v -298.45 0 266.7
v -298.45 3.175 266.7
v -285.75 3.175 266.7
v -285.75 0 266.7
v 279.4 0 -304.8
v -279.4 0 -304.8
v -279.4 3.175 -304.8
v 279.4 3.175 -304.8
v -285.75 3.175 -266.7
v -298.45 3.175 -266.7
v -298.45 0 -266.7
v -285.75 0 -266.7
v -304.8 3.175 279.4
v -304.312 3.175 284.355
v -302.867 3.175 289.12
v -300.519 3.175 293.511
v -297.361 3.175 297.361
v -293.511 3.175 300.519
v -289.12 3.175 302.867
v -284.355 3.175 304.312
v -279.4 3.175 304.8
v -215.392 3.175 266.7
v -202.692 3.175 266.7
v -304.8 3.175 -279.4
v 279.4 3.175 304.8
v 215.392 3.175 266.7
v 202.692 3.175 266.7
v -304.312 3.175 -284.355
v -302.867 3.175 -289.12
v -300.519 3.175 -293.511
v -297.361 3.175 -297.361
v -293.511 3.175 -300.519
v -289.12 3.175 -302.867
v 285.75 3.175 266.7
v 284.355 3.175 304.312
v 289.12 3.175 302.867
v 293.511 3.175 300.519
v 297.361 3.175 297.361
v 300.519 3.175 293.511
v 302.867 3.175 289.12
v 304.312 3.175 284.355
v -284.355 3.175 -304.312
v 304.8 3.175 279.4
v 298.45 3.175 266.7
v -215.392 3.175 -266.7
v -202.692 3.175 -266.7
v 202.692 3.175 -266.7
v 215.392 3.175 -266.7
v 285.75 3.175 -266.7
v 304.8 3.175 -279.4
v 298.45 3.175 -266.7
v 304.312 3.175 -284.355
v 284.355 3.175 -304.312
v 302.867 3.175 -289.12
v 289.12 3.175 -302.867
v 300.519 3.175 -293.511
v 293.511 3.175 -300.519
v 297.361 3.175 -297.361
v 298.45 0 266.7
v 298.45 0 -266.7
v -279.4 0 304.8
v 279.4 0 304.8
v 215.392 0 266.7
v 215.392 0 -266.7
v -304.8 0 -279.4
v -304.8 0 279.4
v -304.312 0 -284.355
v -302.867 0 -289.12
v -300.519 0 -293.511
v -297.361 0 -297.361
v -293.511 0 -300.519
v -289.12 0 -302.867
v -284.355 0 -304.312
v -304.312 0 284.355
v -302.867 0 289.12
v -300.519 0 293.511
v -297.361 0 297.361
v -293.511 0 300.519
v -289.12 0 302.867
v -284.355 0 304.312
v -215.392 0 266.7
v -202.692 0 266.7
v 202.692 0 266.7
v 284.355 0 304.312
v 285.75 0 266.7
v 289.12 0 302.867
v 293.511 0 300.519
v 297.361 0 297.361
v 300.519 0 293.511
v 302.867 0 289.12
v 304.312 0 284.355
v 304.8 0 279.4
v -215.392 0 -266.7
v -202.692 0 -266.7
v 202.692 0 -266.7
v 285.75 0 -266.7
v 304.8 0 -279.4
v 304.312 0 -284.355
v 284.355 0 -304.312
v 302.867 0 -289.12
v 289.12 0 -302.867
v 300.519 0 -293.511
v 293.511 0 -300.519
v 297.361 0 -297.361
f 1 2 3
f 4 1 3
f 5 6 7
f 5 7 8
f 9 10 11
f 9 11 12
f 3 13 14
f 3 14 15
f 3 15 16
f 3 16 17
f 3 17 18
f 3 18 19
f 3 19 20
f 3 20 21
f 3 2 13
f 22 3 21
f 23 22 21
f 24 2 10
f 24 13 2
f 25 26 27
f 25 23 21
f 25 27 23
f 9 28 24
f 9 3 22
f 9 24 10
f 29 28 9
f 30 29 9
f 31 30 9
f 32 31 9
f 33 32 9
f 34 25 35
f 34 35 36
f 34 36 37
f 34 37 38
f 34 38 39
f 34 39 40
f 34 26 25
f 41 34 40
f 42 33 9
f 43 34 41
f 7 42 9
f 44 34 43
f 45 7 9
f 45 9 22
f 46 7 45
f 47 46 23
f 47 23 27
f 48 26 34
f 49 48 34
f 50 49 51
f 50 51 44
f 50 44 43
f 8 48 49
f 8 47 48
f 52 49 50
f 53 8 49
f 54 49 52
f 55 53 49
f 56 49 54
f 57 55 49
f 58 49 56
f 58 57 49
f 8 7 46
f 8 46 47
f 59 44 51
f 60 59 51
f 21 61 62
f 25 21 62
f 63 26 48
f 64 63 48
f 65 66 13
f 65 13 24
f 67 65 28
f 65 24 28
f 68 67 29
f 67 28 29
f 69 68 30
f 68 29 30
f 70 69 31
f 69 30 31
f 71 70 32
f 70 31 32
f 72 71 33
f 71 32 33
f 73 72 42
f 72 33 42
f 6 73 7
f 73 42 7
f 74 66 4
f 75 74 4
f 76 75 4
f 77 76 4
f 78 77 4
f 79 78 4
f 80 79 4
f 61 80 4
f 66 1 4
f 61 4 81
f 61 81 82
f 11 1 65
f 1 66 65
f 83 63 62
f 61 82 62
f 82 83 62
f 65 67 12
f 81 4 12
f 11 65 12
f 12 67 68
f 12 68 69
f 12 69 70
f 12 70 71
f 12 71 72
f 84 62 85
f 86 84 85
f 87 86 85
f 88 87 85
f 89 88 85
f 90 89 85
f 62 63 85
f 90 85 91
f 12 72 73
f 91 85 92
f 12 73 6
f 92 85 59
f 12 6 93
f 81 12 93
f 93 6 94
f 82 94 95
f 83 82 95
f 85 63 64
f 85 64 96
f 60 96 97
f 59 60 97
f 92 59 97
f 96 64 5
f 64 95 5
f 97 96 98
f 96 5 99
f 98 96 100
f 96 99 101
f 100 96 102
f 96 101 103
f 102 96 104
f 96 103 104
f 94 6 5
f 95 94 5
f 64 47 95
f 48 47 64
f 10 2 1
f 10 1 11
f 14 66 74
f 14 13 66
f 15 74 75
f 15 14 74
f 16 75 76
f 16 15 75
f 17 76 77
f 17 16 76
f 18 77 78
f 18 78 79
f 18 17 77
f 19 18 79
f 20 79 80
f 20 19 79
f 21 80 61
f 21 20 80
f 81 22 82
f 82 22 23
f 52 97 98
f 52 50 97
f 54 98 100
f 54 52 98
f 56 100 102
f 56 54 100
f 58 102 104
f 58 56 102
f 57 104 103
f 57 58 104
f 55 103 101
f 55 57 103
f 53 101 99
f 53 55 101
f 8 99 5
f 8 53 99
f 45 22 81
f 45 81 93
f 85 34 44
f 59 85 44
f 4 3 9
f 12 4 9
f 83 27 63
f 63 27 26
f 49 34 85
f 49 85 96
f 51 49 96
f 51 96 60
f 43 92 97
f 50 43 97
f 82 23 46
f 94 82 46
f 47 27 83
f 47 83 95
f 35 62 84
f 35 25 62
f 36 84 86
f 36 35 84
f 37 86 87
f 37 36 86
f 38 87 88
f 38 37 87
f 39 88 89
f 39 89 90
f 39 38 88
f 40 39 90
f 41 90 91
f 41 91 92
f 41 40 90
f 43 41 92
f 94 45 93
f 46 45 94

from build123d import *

# Parameters (mm, degrees)
SKETCH1_W           = 609.6
SKETCH1_H           = 609.6
BOSS_EXTRUDE1_DEPTH = 3.175
FILLET1_R           = 25.4
SKETCH2_W           = 12.7
SKETCH2_H           = 533.4
CUT_EXTRUDE1_DEPTH  = 3.175


with BuildPart() as part:
    # Sketch1 → Boss-Extrude1 (new body)
    with BuildSketch(Plane(origin=(0, 0, 0), x_dir=(1, 0, 0), z_dir=(0, 1, 0))):
        Rectangle(SKETCH1_W, SKETCH1_H)
    extrude(amount=BOSS_EXTRUDE1_DEPTH)

    # Fillet1
    fillet1_edges = [part.edges().sort_by_distance(p)[0] for p in [
        (304.8, 1.5875, 304.8),
        (-304.8, 1.5875, 304.8),
        (-304.8, 1.5875, -304.8),
        (304.8, 1.5875, -304.8),
    ]]
    fillet(fillet1_edges, radius=FILLET1_R)

    # Sketch2 → Cut-Extrude1 (cut)
    with BuildSketch(Plane(origin=(0, 3.175, 0), x_dir=(1, 0, 0), z_dir=(0, 1, 0))):
        with Locations((209.042, 0)):
            Rectangle(SKETCH2_W, SKETCH2_H)
        with Locations((-209.042, 0)):
            Rectangle(SKETCH2_W, SKETCH2_H)
        with Locations((-292.1, 0)):
            Rectangle(SKETCH2_W, SKETCH2_H)
        with Locations((292.1, 0)):
            Rectangle(SKETCH2_W, SKETCH2_H)
    extrude(amount=-CUT_EXTRUDE1_DEPTH, mode=Mode.SUBTRACT)


solid = part.part
